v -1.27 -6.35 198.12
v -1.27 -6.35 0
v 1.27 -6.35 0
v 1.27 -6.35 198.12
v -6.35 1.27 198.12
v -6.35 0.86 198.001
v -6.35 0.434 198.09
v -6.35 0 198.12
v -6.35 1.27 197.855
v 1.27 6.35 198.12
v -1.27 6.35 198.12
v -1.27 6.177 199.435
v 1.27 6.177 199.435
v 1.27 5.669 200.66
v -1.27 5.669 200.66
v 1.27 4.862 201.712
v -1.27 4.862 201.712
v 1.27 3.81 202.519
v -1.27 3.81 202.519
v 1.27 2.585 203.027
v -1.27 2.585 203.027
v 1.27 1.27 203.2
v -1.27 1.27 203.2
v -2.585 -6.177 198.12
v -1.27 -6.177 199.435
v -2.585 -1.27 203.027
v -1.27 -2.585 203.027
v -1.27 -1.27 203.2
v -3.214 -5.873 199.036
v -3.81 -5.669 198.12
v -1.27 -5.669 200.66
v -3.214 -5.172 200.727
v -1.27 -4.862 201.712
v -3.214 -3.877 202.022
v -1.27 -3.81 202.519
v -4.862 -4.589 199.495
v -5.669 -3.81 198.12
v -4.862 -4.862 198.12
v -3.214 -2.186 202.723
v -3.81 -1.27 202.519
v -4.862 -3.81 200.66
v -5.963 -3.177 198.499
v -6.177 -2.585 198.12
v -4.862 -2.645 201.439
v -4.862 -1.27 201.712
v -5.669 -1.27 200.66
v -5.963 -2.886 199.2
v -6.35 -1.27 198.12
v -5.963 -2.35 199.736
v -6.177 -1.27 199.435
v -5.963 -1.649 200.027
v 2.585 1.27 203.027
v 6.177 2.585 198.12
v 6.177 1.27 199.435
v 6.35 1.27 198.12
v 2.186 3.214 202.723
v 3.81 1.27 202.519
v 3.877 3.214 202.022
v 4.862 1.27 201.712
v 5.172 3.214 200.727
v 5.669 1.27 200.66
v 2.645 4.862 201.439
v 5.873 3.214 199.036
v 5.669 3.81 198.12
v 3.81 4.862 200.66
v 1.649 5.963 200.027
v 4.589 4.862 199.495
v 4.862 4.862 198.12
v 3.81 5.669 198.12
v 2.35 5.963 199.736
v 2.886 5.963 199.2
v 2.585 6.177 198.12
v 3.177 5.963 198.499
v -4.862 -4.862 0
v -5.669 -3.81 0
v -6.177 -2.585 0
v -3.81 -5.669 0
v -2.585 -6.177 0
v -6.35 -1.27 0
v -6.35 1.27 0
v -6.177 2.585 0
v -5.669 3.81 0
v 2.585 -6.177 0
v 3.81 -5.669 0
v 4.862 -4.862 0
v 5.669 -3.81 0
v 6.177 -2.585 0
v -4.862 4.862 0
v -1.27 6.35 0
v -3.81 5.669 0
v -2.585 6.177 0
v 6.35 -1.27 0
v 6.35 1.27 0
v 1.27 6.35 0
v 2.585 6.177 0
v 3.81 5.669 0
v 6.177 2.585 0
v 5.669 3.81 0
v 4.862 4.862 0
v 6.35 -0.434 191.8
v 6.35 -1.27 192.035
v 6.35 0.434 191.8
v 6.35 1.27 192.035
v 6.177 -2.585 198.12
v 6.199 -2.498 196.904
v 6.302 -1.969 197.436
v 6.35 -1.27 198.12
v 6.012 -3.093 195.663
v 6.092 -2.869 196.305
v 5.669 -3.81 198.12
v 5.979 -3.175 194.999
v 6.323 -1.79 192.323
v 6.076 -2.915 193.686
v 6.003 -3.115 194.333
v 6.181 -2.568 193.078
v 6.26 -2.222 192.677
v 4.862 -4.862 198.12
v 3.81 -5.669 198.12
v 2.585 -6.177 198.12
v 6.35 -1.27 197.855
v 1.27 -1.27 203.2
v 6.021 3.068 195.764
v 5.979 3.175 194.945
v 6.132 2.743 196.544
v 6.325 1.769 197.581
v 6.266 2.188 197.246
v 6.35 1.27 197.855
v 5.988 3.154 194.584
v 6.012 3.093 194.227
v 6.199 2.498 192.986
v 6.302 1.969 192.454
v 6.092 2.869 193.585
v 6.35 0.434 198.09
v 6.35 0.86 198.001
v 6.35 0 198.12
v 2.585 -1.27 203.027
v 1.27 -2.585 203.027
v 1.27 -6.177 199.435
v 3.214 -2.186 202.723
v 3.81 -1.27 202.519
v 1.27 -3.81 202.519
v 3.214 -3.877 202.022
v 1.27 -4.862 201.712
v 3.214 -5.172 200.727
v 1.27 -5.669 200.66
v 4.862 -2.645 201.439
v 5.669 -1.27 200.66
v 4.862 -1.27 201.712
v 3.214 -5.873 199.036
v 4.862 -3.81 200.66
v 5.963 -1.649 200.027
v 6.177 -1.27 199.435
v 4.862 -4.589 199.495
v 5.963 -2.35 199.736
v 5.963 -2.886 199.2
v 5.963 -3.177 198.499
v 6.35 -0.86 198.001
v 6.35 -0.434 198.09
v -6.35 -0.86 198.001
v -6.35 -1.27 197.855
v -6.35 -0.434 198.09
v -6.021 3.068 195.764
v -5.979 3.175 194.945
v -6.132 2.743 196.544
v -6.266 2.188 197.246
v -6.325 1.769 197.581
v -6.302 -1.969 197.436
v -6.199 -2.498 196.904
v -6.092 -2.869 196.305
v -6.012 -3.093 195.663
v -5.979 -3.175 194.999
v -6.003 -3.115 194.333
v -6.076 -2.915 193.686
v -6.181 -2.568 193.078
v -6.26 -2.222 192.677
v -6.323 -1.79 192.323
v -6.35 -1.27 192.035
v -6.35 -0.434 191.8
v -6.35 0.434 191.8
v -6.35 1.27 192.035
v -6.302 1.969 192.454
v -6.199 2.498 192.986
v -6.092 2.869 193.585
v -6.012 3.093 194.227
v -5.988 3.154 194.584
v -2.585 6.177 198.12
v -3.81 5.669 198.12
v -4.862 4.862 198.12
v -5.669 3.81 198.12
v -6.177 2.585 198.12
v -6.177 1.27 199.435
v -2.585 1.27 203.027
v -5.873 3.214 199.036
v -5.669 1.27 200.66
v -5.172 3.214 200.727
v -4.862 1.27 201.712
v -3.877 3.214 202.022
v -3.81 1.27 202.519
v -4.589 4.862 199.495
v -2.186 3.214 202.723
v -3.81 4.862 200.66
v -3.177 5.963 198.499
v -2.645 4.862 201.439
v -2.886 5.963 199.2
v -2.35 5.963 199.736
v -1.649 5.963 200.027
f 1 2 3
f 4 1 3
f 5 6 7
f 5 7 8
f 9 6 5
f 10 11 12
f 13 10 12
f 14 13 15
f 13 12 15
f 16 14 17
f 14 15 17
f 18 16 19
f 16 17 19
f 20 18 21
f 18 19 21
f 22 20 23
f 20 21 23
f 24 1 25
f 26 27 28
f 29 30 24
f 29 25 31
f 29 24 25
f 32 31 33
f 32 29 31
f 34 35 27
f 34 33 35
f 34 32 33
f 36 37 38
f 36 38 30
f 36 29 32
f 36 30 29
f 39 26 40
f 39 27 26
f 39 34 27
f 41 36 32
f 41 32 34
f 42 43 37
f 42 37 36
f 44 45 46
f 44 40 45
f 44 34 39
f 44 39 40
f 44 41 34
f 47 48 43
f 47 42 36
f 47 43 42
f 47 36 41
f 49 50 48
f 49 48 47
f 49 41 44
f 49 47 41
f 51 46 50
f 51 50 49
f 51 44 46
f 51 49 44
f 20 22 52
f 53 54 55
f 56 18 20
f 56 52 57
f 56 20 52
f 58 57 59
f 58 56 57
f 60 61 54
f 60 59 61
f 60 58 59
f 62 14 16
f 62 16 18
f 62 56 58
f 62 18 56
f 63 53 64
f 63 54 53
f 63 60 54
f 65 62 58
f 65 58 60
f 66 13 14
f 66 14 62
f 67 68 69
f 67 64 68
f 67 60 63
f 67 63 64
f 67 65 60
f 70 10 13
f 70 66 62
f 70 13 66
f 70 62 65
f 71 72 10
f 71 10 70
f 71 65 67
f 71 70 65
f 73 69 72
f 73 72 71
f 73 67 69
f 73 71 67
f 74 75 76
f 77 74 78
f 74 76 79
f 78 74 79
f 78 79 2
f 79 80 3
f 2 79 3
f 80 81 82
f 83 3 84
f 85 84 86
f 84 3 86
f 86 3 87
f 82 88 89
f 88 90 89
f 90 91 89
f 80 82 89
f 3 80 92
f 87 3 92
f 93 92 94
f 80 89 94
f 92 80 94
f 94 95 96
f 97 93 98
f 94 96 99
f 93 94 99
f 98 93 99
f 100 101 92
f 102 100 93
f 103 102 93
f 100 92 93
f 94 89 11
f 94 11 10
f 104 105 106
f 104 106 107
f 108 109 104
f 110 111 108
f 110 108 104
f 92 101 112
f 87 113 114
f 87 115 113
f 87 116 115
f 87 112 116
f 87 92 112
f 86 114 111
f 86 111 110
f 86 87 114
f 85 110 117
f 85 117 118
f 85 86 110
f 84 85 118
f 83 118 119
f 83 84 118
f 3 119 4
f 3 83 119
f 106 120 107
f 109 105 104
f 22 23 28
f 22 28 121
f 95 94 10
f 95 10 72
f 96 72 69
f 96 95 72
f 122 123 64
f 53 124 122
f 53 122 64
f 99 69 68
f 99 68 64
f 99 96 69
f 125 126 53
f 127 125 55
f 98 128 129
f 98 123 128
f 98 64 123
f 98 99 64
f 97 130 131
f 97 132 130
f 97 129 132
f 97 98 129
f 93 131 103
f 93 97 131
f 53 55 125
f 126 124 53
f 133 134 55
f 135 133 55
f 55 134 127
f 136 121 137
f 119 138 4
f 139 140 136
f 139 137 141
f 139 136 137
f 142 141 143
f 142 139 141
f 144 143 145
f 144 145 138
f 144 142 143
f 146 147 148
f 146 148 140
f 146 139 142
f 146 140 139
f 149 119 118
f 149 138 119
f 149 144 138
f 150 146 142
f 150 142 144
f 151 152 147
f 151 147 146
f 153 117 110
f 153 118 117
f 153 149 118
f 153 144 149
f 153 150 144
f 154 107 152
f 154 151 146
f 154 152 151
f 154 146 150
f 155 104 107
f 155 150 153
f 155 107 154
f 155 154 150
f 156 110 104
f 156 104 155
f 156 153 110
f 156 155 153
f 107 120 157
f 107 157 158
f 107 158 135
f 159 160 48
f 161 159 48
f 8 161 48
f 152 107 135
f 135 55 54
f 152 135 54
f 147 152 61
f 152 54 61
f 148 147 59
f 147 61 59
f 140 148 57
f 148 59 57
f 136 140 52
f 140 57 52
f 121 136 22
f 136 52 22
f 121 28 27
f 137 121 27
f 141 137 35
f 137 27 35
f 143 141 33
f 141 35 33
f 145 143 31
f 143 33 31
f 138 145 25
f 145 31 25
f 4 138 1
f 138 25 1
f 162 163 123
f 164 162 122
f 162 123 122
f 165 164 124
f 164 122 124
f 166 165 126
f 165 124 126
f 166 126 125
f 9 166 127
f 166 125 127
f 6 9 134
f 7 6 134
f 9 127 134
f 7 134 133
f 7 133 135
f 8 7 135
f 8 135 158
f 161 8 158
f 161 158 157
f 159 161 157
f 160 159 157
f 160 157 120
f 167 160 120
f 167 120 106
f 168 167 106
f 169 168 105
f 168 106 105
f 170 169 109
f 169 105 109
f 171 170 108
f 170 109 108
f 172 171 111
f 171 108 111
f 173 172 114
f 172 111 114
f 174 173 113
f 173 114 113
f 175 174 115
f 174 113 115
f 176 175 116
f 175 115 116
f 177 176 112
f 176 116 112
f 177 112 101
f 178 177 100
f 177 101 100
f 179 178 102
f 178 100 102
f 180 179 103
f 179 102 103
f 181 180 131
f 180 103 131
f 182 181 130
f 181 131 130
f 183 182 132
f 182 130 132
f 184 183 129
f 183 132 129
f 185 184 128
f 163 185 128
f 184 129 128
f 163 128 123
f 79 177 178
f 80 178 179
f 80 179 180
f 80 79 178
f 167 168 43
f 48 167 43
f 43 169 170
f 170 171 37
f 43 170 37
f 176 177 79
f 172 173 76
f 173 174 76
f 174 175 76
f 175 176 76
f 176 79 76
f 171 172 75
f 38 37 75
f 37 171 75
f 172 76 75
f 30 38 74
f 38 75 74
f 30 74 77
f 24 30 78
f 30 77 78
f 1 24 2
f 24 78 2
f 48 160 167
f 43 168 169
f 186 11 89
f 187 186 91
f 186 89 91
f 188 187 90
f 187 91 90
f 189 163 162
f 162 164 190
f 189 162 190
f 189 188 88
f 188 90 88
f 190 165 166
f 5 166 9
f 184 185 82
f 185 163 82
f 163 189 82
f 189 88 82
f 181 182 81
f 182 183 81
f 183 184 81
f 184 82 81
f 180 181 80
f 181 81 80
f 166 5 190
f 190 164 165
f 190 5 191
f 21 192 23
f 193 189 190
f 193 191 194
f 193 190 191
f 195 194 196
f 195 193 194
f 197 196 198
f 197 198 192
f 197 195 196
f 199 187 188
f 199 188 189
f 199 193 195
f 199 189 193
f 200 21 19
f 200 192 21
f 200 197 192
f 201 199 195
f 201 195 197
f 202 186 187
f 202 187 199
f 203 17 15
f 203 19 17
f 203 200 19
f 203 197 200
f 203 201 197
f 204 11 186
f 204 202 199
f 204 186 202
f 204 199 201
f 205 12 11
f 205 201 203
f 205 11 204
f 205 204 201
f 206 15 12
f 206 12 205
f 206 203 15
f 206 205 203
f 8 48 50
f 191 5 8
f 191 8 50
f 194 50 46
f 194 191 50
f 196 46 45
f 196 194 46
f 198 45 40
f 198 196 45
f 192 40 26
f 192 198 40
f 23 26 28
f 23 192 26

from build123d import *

# Parameters (mm, degrees)
F0_W         = 12.7
F0_H         = 12.7
F1_DEPTH     = 203.2
F2_R         = 3.175
F3_DEPTH     = 25.4
F4_T1_DEPTH  = 210.82
F4_T3_DEPTH  = 2.54
F4_T5_DEPTH  = 2.54
F4_S9_W      = 5.08
F4_S9_H      = 5.08
F4_T10_DEPTH = 5.08
F4_S15_W     = 5.08
F4_S15_H     = 5.08
F4_T16_DEPTH = 5.08
F4_S21_W     = 5.08
F4_S21_H     = 5.08
F4_T22_DEPTH = 5.08
F4_S27_W     = 5.08
F4_S27_H     = 5.08
F4_T28_DEPTH = 5.08


# Not quite as in the source:
# - a fillet or chamfer that OpenCascade refuses, or shapes differently, is made with other operations: its cross-section is extruded or revolved along the edge and cut away or added


with BuildPart() as f1:
    # F0 (on Top) → F1 (new body)
    with BuildSketch(Plane.XY):
        Rectangle(F0_W, F0_H)
    extrude(amount=F1_DEPTH)

    # F2 (on face) → F3 (cut)
    with BuildSketch(Plane.YZ.offset(6.35)):
        with Locations((0, 194.945)):
            Circle(F2_R)
    extrude(amount=-F3_DEPTH, mode=Mode.SUBTRACT)

    # F4: fillet of radius 5.08 on 8 edges, made by hand

    # F4_s2 → F4_t1 (cut)
    with BuildSketch(Plane.XY.offset(-12.7)):
        with BuildLine():
            ThreePointArc((1.27, 6.35), (4.8621024484, 4.8621024484), (6.35, 1.27))
            Line((6.35, 1.27), (6.35, 6.35))
            Line((6.35, 6.35), (1.27, 6.35))
        make_face()
        with BuildLine():
            ThreePointArc((6.35, -1.27), (4.8621024484, -4.8621024484), (1.27, -6.35))
            Line((1.27, -6.35), (6.35, -6.35))
            Line((6.35, -6.35), (6.35, -1.27))
        make_face()
        with BuildLine():
            ThreePointArc((-1.27, 6.35), (-4.8621024484, 4.8621024484), (-6.35, 1.27))
            Line((-6.35, 1.27), (-6.35, 6.35))
            Line((-6.35, 6.35), (-1.27, 6.35))
        make_face()
        with BuildLine():
            ThreePointArc((-6.35, -1.27), (-4.8621024484, -4.8621024484), (-1.27, -6.35))
            Line((-1.27, -6.35), (-6.35, -6.35))
            Line((-6.35, -6.35), (-6.35, -1.27))
        make_face()
    extrude(amount=F4_T1_DEPTH, mode=Mode.SUBTRACT)

    # F4_s4 → F4_t3 (cut)
    with BuildSketch(Plane.YZ.offset(-1.27)):
        with BuildLine():
            ThreePointArc((6.35, 198.12), (4.8621024484, 201.7121024484), (1.27, 203.2))
            Line((1.27, 203.2), (6.35, 203.2))
            Line((6.35, 203.2), (6.35, 198.12))
        make_face()
        with BuildLine():
            ThreePointArc((-1.27, 203.2), (-4.8621024484, 201.7121024484), (-6.35, 198.12))
            Line((-6.35, 198.12), (-6.35, 203.2))
            Line((-6.35, 203.2), (-1.27, 203.2))
        make_face()
    extrude(amount=F4_T3_DEPTH, mode=Mode.SUBTRACT)

    # F4_s6 → F4_t5 (cut)
    with BuildSketch(Plane.XZ.offset(-1.27)):
        with BuildLine():
            ThreePointArc((6.35, 198.12), (4.8621024484, 201.7121024484), (1.27, 203.2))
            Line((1.27, 203.2), (6.35, 203.2))
            Line((6.35, 203.2), (6.35, 198.12))
        make_face()
        with BuildLine():
            ThreePointArc((-6.35, 198.12), (-4.8621024484, 201.7121024484), (-1.27, 203.2))
            Line((-1.27, 203.2), (-6.35, 203.2))
            Line((-6.35, 203.2), (-6.35, 198.12))
        make_face()
    extrude(amount=F4_T5_DEPTH, mode=Mode.SUBTRACT)


with BuildPart() as f4_tool8:
    # F4_s9 → F4_t10 (new body)
    with BuildSketch(Plane.XZ.offset(-1.27)):
        with Locations((3.81, 200.66)):
            Rectangle(F4_S9_W, F4_S9_H)
    extrude(amount=-F4_T10_DEPTH)

    # F4_s11 → F4_t12 (revolve, cut)
    with BuildSketch(Plane(origin=(1.27, 1.27, 198.12), x_dir=(-0.7071067812, 0, -0.7071067812), z_dir=(0.7071067812, 0, -0.7071067812))):
        with BuildLine():
            ThreePointArc((0, -5.08), (5.08, 0), (0, 5.08))
            Line((0, 5.08), (0, -5.08))
        make_face()
    revolve(axis=Axis((1.27, 1.27, 198.12), (0, 1, 0)), mode=Mode.SUBTRACT)


with BuildPart() as f1_1:
    add(f1.part)

    # F4_t7: cut F4_tool8
    add(f4_tool8.part, mode=Mode.SUBTRACT)


with BuildPart() as f4_tool14:
    # F4_s15 → F4_t16 (new body)
    with BuildSketch(Plane.YZ.offset(1.27)):
        with Locations((-3.81, 200.66)):
            Rectangle(F4_S15_W, F4_S15_H)
    extrude(amount=F4_T16_DEPTH)

    # F4_s17 → F4_t18 (revolve, cut)
    with BuildSketch(Plane(origin=(1.27, -1.27, 198.12), x_dir=(0, 0.7071067812, -0.7071067812), z_dir=(0, -0.7071067812, -0.7071067812))):
        with BuildLine():
            ThreePointArc((0, -5.08), (5.08, 0), (0, 5.08))
            Line((0, 5.08), (0, -5.08))
        make_face()
    revolve(axis=Axis((1.27, -1.27, 198.12), (1, 0, 0)), mode=Mode.SUBTRACT)


with BuildPart() as f1_2:
    add(f1_1.part)

    # F4_t13: cut F4_tool14
    add(f4_tool14.part, mode=Mode.SUBTRACT)


with BuildPart() as f4_tool20:
    # F4_s21 → F4_t22 (new body)
    with BuildSketch(Plane.XZ.offset(-1.27)):
        with Locations((-3.81, 200.66)):
            Rectangle(F4_S21_W, F4_S21_H)
    extrude(amount=-F4_T22_DEPTH)

    # F4_s23 → F4_t24 (revolve, cut)
    with BuildSketch(Plane(origin=(-1.27, 1.27, 198.12), x_dir=(0.7071067812, 0, -0.7071067812), z_dir=(0.7071067812, 0, 0.7071067812))):
        with BuildLine():
            ThreePointArc((0, -5.08), (5.08, 0), (0, 5.08))
            Line((0, 5.08), (0, -5.08))
        make_face()
    revolve(axis=Axis((-1.27, 1.27, 198.12), (0, 1, 0)), mode=Mode.SUBTRACT)


with BuildPart() as f1_3:
    add(f1_2.part)

    # F4_t19: cut F4_tool20
    add(f4_tool20.part, mode=Mode.SUBTRACT)


with BuildPart() as f4_tool26:
    # F4_s27 → F4_t28 (new body)
    with BuildSketch(Plane.YZ.offset(-1.27)):
        with Locations((-3.81, 200.66)):
            Rectangle(F4_S27_W, F4_S27_H)
    extrude(amount=-F4_T28_DEPTH)

    # F4_s29 → F4_t30 (revolve, cut)
    with BuildSketch(Plane(origin=(-1.27, -1.27, 198.12), x_dir=(0, 0.7071067812, -0.7071067812), z_dir=(0, 0.7071067812, 0.7071067812))):
        with BuildLine():
            ThreePointArc((0, -5.08), (5.08, 0), (0, 5.08))
            Line((0, 5.08), (0, -5.08))
        make_face()
    revolve(axis=Axis((-1.27, -1.27, 198.12), (-1, 0, 0)), mode=Mode.SUBTRACT)


with BuildPart() as f1_4:
    add(f1_3.part)

    # F4_t25: cut F4_tool26
    add(f4_tool26.part, mode=Mode.SUBTRACT)


solid = f1_4.part
